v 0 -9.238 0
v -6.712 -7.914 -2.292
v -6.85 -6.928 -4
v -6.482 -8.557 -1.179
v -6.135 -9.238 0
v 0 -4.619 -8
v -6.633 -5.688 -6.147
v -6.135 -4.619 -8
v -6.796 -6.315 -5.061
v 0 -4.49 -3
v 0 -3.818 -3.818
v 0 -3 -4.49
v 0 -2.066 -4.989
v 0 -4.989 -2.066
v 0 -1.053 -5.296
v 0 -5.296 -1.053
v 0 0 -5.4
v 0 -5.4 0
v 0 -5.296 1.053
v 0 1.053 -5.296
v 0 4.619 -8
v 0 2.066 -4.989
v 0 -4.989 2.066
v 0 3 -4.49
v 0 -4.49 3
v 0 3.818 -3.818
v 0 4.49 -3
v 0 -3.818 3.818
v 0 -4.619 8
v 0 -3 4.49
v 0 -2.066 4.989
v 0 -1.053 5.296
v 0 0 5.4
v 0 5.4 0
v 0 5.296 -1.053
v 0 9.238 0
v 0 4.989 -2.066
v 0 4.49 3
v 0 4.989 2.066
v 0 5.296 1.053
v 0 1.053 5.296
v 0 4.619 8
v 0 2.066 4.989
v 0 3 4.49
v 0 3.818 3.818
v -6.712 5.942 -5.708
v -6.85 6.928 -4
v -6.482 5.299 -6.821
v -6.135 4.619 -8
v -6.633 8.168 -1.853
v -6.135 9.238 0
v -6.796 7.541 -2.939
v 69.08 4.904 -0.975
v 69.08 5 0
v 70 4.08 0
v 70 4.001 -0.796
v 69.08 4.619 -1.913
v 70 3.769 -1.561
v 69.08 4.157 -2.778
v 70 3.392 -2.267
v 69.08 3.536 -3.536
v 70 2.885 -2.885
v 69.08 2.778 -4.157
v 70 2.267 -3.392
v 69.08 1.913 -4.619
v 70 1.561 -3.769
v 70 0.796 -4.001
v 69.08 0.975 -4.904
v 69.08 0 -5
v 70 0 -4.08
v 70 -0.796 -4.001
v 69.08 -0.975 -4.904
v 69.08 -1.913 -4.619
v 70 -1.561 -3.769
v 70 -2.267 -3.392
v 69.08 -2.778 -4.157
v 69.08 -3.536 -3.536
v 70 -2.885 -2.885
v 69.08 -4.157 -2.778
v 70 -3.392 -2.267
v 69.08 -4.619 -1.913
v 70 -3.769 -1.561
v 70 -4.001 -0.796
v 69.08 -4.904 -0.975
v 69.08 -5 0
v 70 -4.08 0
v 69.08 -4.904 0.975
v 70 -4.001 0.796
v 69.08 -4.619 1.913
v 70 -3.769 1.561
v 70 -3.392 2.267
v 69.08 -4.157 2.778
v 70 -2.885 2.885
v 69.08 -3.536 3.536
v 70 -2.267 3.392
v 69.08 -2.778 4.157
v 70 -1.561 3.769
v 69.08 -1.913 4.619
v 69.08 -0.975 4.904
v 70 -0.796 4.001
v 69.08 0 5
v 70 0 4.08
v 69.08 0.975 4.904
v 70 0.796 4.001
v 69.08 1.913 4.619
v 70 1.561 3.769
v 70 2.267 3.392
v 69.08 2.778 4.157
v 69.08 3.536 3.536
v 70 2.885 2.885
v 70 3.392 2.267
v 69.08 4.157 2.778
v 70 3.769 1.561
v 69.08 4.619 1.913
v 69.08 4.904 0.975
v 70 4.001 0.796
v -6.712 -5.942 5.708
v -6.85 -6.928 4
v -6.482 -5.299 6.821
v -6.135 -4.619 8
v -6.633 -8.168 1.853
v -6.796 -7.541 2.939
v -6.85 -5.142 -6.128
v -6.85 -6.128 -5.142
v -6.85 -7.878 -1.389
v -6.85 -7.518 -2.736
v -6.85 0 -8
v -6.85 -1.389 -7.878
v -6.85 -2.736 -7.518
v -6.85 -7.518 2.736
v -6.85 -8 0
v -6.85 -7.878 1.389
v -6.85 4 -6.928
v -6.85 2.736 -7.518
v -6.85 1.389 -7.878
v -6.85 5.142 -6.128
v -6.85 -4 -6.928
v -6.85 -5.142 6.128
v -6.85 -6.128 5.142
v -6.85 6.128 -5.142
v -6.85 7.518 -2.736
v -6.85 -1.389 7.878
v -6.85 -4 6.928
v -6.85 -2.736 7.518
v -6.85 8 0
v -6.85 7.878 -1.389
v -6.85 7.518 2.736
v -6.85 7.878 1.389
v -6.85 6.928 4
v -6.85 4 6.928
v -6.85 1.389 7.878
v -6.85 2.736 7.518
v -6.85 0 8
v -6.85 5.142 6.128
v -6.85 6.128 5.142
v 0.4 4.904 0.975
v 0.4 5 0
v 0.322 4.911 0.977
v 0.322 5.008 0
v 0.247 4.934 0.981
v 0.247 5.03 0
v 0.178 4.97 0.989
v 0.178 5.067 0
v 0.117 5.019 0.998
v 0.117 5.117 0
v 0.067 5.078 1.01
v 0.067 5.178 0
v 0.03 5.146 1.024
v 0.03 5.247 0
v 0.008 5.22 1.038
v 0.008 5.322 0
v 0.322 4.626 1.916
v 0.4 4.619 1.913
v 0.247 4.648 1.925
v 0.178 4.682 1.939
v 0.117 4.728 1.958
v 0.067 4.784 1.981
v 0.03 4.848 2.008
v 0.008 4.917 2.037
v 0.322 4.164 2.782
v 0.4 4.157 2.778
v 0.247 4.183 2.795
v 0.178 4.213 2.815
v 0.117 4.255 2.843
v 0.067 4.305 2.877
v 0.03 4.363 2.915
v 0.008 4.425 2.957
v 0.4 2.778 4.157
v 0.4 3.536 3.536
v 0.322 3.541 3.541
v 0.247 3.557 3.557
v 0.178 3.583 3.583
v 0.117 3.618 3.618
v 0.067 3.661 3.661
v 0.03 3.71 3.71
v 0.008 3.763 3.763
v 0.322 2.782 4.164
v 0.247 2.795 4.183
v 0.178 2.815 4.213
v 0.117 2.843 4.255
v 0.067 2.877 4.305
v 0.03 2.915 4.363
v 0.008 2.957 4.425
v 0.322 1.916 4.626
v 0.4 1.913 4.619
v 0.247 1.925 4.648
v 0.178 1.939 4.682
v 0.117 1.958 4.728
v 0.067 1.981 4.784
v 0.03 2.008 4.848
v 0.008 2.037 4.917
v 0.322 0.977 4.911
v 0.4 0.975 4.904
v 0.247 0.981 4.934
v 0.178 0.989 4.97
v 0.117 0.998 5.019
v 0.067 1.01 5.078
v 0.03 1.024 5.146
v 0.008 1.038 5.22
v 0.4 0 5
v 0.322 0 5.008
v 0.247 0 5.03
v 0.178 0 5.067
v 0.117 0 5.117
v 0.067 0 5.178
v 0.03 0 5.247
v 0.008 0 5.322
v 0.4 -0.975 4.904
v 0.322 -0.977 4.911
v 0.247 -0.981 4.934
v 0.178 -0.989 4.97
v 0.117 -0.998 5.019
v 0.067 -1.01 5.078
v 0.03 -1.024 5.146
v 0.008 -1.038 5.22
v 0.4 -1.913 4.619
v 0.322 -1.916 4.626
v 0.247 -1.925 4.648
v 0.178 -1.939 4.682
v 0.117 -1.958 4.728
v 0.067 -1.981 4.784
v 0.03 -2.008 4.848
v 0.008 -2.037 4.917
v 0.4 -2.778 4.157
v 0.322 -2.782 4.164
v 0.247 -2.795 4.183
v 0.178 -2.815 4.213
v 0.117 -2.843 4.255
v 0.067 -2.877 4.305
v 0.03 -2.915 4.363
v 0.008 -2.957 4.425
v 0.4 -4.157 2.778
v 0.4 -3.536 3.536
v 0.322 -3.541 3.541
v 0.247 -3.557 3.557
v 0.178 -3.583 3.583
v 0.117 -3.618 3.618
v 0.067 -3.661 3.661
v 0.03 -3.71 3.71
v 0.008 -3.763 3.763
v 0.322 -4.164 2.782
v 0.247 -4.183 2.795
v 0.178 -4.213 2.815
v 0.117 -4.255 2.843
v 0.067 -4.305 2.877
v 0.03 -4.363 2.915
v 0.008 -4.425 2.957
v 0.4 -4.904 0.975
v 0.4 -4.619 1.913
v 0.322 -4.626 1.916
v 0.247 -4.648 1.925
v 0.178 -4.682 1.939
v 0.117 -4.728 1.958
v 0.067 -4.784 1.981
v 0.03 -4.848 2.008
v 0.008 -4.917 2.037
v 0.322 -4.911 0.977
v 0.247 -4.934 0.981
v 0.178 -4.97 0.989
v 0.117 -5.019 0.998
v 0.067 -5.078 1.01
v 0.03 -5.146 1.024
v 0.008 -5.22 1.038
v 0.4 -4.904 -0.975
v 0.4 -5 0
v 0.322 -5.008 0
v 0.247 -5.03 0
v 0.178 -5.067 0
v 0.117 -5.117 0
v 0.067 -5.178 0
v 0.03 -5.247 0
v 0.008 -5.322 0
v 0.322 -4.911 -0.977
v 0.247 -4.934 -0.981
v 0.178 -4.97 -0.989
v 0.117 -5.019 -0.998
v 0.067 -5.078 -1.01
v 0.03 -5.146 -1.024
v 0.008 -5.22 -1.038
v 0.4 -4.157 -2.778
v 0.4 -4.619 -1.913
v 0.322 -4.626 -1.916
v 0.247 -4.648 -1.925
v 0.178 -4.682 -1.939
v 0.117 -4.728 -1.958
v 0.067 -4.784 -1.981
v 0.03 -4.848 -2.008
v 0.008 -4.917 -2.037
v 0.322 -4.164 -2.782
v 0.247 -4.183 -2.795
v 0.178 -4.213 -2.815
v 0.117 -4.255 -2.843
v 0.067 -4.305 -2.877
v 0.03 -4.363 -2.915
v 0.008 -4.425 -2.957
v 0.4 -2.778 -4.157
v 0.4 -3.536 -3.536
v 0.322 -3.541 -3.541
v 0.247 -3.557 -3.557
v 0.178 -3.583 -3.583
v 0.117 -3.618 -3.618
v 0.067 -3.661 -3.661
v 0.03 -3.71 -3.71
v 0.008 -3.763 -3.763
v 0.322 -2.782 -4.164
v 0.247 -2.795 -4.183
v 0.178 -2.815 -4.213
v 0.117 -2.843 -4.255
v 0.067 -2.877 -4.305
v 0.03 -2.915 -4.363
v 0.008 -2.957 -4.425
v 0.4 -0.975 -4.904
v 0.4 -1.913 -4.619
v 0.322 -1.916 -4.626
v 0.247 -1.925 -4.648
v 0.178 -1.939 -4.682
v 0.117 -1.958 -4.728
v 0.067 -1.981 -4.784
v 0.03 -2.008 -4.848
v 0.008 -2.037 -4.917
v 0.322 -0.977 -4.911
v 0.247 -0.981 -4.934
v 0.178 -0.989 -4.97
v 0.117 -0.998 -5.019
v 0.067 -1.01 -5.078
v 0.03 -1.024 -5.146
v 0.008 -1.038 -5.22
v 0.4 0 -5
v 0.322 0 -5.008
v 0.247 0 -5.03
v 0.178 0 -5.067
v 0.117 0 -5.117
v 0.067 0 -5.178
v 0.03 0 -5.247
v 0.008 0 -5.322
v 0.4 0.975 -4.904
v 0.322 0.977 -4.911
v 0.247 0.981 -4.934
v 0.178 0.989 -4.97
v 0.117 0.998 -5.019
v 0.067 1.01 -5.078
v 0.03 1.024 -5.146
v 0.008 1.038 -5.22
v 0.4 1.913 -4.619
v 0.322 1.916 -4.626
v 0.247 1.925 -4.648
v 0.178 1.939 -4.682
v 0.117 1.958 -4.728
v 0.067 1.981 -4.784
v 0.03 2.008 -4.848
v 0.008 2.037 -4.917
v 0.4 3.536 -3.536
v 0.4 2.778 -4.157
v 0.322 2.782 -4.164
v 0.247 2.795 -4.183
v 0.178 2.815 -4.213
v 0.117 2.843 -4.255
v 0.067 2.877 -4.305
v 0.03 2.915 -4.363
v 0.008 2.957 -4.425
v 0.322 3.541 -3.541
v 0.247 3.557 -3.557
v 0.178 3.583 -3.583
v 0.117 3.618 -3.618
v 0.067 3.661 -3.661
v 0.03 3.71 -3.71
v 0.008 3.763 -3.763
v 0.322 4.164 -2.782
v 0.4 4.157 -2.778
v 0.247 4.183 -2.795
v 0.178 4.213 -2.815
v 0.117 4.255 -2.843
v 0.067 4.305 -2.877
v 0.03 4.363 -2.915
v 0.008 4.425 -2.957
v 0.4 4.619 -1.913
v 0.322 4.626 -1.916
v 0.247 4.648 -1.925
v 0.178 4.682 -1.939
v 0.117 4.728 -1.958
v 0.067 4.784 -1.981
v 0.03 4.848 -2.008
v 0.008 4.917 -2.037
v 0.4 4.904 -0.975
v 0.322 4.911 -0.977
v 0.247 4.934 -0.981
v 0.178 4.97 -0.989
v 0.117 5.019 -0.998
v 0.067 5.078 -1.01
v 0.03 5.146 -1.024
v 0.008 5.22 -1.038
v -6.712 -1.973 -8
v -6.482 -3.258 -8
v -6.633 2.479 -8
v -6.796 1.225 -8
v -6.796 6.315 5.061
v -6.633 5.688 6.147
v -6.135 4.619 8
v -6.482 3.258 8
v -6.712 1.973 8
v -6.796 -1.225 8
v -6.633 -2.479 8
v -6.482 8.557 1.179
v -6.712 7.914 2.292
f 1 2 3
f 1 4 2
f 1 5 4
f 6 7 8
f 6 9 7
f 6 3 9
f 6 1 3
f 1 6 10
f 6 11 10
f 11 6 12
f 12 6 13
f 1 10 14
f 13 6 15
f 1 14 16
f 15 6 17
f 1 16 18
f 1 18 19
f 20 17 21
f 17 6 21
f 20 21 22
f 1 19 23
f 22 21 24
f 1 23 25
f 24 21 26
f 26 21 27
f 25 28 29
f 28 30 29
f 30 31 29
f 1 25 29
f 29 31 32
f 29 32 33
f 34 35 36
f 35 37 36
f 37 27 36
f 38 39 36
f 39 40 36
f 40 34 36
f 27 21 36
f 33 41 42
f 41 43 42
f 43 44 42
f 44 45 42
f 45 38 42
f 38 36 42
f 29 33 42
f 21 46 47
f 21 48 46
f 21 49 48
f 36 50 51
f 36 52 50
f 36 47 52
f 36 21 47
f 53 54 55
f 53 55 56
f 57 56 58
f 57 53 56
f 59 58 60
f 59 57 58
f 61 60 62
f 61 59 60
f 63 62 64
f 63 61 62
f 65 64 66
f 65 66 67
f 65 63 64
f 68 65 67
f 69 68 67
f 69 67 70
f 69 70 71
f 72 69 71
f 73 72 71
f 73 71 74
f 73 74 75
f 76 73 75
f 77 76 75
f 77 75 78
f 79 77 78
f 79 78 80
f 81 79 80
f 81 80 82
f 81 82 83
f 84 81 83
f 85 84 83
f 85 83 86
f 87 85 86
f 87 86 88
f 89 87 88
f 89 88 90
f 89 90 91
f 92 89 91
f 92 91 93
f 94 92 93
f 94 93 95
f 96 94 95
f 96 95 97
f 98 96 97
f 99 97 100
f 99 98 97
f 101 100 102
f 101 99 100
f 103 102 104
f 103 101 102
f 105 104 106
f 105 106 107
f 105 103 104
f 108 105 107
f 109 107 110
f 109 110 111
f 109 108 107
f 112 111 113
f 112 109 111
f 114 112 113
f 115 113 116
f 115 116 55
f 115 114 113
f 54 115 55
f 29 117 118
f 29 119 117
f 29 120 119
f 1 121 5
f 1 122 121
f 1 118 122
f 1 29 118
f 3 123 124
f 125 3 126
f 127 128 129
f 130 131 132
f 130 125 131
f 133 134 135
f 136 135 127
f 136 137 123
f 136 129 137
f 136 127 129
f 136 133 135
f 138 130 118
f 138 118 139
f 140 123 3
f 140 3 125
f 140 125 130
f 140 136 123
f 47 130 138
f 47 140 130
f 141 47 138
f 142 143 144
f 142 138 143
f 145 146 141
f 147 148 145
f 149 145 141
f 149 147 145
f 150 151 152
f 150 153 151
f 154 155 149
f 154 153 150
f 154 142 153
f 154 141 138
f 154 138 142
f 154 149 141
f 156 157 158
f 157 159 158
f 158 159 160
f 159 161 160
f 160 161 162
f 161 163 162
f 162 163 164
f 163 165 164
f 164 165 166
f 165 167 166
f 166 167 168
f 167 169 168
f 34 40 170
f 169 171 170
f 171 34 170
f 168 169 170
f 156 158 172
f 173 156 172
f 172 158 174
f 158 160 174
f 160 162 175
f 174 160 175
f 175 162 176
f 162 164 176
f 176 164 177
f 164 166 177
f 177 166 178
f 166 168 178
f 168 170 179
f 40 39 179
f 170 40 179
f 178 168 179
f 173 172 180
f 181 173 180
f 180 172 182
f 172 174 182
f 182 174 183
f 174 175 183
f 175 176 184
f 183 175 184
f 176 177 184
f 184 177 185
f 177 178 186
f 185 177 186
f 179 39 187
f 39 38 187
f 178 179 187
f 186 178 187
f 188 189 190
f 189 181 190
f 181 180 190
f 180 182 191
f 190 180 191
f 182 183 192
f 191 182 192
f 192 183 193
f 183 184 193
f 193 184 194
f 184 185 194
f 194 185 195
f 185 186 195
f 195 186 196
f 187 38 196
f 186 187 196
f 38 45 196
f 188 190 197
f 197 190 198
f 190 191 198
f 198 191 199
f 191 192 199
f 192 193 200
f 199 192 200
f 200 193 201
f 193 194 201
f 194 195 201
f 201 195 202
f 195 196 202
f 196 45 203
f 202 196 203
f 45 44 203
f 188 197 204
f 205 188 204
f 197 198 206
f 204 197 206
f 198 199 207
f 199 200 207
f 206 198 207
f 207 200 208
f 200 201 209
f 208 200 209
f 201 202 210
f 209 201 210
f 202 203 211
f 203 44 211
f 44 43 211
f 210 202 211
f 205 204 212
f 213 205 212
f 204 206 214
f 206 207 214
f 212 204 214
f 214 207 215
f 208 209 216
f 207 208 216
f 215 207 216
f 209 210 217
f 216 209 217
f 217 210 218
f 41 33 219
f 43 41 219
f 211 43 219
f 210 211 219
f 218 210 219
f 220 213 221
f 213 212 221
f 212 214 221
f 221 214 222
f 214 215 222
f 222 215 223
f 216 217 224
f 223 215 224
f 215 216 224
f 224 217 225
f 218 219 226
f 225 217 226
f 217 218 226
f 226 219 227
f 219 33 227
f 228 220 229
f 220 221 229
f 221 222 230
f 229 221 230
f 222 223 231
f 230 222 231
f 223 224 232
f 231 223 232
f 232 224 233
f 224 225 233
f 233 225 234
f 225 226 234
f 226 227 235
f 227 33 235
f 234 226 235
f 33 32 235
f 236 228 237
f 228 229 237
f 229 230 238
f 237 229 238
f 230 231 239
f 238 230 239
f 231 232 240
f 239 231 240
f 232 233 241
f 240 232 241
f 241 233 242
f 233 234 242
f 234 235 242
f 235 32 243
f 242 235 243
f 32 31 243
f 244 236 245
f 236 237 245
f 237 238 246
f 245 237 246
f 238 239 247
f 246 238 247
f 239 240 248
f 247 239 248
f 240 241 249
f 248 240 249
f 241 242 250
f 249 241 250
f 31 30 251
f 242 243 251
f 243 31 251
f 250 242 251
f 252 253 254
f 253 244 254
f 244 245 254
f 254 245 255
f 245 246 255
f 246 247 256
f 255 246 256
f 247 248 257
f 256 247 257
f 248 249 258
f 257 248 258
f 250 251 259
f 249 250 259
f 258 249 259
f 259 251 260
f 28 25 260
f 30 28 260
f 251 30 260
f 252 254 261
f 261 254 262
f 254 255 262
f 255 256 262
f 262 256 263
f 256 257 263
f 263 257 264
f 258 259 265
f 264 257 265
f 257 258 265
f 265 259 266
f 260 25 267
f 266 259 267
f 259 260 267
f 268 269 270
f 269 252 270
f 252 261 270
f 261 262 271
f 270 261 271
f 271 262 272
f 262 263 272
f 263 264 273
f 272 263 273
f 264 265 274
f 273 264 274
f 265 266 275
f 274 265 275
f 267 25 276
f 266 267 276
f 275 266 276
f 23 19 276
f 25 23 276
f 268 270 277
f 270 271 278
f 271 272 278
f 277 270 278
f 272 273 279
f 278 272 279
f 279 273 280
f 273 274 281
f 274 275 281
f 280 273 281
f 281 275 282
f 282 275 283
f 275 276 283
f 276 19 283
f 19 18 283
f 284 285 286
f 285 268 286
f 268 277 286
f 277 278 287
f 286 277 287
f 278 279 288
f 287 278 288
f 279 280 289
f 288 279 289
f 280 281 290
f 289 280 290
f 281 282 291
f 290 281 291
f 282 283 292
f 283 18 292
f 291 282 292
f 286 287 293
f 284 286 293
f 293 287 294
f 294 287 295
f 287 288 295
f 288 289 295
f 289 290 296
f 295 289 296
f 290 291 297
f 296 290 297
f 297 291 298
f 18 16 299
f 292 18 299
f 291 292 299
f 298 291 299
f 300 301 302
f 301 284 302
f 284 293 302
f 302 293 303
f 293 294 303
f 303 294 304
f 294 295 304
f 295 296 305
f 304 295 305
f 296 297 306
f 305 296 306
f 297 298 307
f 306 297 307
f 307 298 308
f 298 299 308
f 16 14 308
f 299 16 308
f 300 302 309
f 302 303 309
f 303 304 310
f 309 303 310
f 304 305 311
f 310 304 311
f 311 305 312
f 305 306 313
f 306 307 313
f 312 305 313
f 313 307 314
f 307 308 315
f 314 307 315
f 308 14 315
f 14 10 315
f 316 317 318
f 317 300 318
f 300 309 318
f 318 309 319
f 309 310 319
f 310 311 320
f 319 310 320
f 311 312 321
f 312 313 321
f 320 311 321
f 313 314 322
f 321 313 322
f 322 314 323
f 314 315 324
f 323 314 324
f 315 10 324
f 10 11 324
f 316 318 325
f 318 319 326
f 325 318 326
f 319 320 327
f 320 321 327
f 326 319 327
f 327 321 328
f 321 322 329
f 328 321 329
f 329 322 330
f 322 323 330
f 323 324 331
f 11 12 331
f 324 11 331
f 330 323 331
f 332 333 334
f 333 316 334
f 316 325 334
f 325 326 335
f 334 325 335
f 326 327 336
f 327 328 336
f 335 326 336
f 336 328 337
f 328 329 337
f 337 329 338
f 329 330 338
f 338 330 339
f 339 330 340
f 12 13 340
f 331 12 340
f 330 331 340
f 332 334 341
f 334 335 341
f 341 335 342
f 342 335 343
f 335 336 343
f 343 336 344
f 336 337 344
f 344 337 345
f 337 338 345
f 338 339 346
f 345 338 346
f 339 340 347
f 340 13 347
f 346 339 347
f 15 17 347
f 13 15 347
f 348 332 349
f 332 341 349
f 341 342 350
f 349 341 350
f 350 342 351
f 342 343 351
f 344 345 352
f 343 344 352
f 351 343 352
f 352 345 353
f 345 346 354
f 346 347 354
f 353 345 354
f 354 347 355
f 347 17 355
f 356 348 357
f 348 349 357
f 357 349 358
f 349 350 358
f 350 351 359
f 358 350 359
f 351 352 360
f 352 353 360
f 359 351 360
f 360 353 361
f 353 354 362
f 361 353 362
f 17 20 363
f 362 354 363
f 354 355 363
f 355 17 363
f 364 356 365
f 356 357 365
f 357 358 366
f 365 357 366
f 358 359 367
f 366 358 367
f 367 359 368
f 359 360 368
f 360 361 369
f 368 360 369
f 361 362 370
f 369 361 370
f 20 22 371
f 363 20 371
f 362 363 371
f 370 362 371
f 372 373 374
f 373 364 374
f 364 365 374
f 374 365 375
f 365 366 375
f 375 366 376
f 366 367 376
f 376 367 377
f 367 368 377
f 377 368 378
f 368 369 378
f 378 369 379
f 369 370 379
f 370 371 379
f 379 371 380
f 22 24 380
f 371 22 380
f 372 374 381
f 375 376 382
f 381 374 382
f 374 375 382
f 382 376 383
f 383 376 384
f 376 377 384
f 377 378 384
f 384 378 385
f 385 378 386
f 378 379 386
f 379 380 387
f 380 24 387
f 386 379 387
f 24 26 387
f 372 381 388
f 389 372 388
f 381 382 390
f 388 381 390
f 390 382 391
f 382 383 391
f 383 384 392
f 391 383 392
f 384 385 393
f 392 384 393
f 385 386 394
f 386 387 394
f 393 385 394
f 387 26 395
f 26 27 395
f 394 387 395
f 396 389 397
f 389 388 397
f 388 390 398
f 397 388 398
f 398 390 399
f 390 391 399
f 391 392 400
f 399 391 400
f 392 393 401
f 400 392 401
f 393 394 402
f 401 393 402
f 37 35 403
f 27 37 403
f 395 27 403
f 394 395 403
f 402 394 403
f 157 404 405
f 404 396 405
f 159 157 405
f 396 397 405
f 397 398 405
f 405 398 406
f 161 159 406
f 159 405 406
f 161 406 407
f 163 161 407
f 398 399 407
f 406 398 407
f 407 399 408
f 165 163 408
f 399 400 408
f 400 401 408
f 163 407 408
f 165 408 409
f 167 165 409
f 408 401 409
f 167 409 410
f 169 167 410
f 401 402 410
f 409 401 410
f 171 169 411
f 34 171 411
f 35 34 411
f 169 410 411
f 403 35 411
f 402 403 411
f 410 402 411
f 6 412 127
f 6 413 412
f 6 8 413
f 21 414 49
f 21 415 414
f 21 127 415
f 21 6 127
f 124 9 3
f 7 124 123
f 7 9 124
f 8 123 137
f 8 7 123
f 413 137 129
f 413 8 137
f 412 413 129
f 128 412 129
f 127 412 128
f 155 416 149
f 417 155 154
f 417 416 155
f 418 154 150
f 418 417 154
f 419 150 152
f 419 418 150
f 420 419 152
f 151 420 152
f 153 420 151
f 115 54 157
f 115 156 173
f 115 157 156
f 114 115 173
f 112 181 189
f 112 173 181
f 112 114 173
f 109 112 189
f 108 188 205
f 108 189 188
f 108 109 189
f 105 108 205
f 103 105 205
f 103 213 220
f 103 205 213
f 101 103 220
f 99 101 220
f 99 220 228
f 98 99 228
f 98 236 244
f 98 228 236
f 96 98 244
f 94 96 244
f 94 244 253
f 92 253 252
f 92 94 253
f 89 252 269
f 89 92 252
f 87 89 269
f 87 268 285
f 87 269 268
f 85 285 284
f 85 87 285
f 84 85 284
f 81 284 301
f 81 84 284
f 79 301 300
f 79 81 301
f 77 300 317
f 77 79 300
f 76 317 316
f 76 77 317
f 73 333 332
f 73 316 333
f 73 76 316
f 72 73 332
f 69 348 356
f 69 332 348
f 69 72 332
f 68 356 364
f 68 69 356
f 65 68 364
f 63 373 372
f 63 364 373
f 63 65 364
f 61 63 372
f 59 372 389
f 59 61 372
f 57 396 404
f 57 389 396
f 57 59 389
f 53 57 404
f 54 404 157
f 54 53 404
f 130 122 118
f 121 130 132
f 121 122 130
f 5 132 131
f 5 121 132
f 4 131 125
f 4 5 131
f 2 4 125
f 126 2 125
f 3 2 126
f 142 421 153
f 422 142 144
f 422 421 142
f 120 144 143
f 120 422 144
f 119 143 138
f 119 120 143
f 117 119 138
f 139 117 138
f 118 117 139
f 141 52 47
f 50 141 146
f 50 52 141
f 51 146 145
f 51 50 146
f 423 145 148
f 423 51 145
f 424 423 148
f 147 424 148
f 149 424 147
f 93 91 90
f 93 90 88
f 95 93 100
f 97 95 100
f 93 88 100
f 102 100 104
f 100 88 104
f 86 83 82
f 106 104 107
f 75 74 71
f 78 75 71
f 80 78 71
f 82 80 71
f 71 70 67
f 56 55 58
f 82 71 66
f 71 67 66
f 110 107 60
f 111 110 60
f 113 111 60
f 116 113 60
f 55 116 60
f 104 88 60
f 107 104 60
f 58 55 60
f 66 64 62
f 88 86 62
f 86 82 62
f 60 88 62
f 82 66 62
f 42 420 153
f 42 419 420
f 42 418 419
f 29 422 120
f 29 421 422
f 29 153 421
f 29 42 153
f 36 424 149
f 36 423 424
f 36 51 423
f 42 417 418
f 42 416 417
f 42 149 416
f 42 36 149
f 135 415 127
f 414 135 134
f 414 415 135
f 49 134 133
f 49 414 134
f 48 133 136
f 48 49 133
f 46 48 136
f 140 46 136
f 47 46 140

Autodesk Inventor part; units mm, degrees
ref_plane "YZ Plane" through (0, 0, 0) normal (1, 0, 0) x (0, 1, 0)
ref_plane "XZ Plane" through (0, 0, 0) normal (0, 1, 0) x (-1, 0, 0)
sketch "Эскиз1" plane through (0, 0, 0) normal (0, 0, 1) x (1, 0, 0)
  line L0 (0, 5) -> (70, 5)
  line L1 (70, 5) -> (70, 0)
  line L2 (70, 0) -> (0, 0)
  line L3 (-14, 0) -> (84, 0) projected
  line L4 (0, -1) -> (0, 6) projected
  line L5 (0, 5) -> (0, 0)
  dimension "d2" = 10
  dimension "d59" = 70
revolve "Базовый элемент" add sketch "Эскиз1" angle 360 about axis through (70, 0, 0) along (-1, 0, 0)
sketch "Эскиз2" plane through (0, 0, 0) normal (-1, 0, 0) x (0, 0, 1)
  line L0 (0, 9.2376) -> (8, 4.6188)
  line L1 (8, 4.6188) -> (8, -4.6188)
  line L2 (8, -4.6188) -> (0, -9.2376)
  line L3 (0, -9.2376) -> (-8, -4.6188)
  line L4 (-8, -4.6188) -> (-8, 4.6188)
  line L5 (-8, 4.6188) -> (0, 9.2376)
  line L6 (-11.2, 0) -> (11.2, 0) projected
  line L7 (0, 12.9326) -> (0, -12.9326) projected
  point P0 (0, 0)
  point P1 (0, 0)
  dimension "d11" = 16
extrude "С головкой" add sketch "Эскиз2" along normal blind 6.85
sketch "Эскиз4" plane through (0, 0, 0) normal (0, 0, 1) x (1, 0, 0)
  line L0 (-5.9262, 9.6) -> (-6.85, 8)
  line L1 (-1.1, 0) -> (-0.234, 0)
  line L2 (-8.1732, 0) -> (1.0892, 0) projected
  line L3 (-6.85, 9.6) -> (-5.9262, 9.6)
  line L4 (-6.85, 8) -> (-6.85, 9.6)
  line L5 (0, 11.52) -> (0, -1.92) projected
  dimension "d65" = 16
  dimension "d67" = 30
  dimension "d68" = 19.2
  dimension "d69" = 6.85
revolve "Фаска1" cut sketch "Эскиз4" angle 360 about axis through (-1.1, 0, 0) along (1, 0, 0)
thread "Резьба" size "M10x1.5" class "6g" standard "ISO Metric profile" length 26
chamfer "Фаска2" distance 0.9202 distance2 0.9203 1 edges at (70, -5, 0) measured on face at (70, -2.0394, -1.2014)
fillet "Fillet" radius 0.4 1 edges at (0, -5, 0)
ref_plane "Work Plane1" through (1.525, 0, 0) normal (0, 0, 1) x (1, 0, 0)
equation "\"d2\" = GD"
equation "\"d59\" = NLG"
equation "\"d11\" = SW"
equation "\"d3\" = KOH"
equation "\"d71\" = RR1"
equation "\"d15\" = GEL"
equation "\"d6\" = -0.5 * SPD + 0.5 * GD"
equation "\"d65\" = SW"
equation "\"d67\" = ANG1"
equation "\"d68\" = 1.2 * SW"
equation "\"d69\" = KOH"
equation "\"NLG\" = 70"
equation "\"GD\" = NND"
equation "\"KOH\" = 6.85"
equation "\"GEL\" = 26"
equation "\"SW\" = 16"
equation "\"SW0\" = SW"
equation "\"SPD\" = NND - 1.2269 * PTC"
equation "\"SD\" = 0"
equation "\"ANG1\" = 30deg"
equation "\"GAL\" = 0.61345 * PTC"
equation "\"GUL\" = 0.61345 * PTC"
equation "\"RR\" = 0.1"
equation "\"RR1\" = 0.4"
equation "\"GD1\" = THREADDIA - 1.2269 * PTC"
equation "\"TOA\" = 30deg"
equation "\"PTC\" = 1.5"
equation "\"KOH1\" = 4.5"
equation "\"E0\" = 1.155 * SW"
equation "\"NND\" = 10"
equation "\"THREADDIA\" = 10"
properties part number "ANSI B18.2.3.5M - M10 x 1,5 x 70" material "Сталь, мягкая"
